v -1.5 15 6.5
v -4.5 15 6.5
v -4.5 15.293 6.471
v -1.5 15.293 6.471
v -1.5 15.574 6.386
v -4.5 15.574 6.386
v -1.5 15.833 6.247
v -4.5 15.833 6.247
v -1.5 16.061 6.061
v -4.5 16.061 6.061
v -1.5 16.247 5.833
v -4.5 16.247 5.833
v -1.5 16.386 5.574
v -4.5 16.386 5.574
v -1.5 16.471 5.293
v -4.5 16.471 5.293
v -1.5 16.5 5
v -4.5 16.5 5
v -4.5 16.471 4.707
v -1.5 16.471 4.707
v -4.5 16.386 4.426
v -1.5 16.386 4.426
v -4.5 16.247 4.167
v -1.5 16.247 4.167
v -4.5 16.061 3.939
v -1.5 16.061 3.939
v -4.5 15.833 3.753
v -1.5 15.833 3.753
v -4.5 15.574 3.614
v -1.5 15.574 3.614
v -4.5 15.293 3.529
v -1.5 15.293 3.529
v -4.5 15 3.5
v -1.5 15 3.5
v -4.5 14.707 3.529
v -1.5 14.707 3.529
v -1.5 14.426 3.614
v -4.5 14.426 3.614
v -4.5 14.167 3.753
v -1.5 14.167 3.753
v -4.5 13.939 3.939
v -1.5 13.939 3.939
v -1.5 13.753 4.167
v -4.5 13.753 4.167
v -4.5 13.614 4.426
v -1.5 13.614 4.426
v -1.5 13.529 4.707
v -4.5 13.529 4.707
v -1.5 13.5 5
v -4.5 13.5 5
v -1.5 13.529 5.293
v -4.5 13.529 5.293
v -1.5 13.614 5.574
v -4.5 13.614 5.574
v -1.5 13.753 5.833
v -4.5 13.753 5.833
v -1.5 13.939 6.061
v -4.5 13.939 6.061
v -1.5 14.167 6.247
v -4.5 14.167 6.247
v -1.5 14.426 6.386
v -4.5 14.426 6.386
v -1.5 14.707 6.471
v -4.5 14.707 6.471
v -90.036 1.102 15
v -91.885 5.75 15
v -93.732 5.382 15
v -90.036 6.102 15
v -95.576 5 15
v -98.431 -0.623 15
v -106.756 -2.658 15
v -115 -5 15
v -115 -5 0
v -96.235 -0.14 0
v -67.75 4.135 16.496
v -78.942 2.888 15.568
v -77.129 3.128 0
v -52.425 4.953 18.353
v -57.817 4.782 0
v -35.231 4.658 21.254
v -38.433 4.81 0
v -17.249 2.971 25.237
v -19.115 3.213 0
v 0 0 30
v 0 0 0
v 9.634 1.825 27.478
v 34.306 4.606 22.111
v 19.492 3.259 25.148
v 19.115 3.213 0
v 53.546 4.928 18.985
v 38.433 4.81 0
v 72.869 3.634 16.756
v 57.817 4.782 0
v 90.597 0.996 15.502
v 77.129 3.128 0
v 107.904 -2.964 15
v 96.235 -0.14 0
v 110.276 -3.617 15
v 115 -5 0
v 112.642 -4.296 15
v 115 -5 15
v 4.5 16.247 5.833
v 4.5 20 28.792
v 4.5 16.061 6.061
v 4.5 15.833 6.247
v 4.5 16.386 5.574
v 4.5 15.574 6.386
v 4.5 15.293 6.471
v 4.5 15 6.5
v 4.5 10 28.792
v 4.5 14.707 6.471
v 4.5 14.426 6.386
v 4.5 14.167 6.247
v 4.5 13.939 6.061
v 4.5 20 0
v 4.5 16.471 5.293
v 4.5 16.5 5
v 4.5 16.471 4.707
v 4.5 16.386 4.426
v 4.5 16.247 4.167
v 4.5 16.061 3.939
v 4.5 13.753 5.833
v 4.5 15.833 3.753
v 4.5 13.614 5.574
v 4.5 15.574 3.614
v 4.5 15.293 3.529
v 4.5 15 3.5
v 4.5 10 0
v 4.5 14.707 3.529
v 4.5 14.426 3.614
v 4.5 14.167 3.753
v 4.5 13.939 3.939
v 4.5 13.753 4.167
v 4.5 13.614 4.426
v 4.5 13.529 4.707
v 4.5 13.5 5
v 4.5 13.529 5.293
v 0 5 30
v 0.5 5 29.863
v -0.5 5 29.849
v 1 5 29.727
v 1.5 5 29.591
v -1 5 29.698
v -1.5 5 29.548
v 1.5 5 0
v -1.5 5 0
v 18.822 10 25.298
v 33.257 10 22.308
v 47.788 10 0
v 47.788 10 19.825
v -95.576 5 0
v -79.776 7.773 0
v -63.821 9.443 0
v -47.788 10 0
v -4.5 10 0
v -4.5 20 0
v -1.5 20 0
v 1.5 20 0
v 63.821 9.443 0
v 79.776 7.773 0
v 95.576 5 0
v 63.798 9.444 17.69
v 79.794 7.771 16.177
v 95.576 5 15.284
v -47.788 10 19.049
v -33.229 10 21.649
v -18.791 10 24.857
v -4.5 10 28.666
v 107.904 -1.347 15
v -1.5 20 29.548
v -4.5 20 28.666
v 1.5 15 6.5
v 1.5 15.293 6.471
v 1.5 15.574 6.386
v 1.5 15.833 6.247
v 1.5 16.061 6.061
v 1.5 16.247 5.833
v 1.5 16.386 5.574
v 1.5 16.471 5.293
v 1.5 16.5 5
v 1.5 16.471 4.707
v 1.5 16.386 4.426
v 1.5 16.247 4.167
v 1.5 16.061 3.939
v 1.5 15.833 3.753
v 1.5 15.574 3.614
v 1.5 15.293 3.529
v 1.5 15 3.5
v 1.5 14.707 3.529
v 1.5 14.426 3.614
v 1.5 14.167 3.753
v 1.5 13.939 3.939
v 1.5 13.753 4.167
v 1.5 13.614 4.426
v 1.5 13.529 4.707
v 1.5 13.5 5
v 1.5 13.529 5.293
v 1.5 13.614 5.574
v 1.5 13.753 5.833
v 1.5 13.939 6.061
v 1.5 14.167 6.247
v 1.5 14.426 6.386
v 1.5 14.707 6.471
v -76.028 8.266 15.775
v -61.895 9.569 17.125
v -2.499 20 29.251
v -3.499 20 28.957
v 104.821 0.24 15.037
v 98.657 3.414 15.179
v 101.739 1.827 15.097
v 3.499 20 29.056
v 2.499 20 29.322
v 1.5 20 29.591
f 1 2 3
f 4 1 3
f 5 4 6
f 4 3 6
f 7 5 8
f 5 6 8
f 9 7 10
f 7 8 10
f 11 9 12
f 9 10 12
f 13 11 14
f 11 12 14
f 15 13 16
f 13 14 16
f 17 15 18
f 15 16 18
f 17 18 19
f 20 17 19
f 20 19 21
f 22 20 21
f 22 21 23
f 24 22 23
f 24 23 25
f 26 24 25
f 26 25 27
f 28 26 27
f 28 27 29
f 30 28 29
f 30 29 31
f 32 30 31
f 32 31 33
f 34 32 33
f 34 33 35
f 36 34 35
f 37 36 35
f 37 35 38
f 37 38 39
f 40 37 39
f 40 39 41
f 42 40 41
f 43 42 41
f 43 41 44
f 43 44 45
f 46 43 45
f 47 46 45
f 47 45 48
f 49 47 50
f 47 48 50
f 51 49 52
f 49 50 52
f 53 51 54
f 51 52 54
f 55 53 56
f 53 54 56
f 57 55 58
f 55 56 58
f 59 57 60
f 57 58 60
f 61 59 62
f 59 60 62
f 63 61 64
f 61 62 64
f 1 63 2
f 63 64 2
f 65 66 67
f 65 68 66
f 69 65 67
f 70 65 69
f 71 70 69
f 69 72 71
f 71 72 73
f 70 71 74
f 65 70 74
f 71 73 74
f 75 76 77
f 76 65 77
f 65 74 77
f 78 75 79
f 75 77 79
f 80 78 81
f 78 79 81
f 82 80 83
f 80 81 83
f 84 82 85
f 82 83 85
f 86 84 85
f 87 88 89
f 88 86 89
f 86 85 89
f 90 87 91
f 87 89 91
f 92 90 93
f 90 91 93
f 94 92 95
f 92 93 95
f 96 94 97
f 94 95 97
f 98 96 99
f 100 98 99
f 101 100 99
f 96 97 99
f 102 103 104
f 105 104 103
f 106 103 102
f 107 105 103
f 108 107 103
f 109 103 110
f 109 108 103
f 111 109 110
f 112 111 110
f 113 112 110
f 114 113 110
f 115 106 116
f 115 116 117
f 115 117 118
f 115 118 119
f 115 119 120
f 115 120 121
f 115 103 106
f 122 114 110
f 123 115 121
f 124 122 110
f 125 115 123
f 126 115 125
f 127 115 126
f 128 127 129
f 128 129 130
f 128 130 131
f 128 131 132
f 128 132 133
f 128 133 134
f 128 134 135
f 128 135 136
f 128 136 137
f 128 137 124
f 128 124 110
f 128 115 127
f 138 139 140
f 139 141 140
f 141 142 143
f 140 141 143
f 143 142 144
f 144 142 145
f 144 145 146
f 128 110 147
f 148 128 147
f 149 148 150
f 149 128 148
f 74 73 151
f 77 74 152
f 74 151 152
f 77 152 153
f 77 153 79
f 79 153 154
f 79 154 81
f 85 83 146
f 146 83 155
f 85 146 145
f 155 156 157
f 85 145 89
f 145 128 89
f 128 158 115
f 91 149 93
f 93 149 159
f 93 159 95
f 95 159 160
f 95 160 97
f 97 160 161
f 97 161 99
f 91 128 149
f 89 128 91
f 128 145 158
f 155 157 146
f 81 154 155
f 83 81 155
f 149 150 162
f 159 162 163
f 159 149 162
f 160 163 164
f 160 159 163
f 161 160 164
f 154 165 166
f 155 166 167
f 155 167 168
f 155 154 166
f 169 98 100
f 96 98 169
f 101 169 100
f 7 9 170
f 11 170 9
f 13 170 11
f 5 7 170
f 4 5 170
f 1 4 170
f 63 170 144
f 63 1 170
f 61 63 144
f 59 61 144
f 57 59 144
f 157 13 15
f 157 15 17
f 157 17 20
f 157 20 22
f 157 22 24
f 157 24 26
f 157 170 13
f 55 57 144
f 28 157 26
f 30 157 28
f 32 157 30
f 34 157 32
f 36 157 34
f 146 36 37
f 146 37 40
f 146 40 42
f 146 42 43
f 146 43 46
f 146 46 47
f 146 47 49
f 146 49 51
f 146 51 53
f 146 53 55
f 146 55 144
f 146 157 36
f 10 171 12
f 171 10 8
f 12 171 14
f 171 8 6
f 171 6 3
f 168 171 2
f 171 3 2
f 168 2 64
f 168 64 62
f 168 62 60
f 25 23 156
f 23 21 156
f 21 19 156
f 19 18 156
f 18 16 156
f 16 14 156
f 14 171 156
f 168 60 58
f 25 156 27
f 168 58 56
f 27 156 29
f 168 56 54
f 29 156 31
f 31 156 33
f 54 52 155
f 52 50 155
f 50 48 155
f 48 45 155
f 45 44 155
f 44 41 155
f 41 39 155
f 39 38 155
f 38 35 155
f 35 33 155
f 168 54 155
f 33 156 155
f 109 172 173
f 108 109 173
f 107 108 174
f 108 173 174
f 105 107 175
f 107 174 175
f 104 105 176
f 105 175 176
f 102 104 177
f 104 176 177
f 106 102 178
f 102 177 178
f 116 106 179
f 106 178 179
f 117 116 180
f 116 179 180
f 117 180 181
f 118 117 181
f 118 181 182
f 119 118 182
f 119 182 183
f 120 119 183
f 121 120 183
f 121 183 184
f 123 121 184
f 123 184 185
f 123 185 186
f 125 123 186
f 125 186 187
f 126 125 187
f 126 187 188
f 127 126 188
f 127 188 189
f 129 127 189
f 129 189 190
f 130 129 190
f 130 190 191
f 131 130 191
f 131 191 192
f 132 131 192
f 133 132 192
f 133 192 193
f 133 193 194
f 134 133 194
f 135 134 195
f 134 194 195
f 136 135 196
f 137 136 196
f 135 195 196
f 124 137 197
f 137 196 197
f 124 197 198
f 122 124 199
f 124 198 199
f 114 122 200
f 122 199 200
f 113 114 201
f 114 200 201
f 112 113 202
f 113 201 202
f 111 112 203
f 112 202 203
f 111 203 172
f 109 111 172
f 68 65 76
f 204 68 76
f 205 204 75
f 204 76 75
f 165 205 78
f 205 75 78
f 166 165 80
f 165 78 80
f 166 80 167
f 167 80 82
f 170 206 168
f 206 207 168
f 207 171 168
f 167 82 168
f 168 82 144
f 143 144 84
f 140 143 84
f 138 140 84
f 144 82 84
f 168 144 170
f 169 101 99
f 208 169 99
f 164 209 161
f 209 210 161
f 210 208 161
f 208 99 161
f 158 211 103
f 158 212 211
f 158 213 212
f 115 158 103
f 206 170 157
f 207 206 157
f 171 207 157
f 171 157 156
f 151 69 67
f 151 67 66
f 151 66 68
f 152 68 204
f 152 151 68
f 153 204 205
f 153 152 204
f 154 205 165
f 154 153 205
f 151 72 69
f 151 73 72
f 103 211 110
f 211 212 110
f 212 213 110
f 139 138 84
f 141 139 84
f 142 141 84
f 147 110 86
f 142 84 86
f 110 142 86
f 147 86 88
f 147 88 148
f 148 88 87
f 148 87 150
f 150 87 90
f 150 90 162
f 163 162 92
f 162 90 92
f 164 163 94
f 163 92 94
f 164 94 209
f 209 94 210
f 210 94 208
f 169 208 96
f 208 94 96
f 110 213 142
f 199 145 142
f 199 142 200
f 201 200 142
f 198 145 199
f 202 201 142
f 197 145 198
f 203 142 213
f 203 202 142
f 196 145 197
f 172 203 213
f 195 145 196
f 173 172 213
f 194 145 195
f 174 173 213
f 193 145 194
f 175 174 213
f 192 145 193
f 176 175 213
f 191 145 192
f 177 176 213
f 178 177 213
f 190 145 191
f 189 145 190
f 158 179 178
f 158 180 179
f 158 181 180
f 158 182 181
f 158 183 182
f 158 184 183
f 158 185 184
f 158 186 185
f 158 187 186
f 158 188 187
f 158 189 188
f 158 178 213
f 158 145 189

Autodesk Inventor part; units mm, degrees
ref_plane "YZ Plane" through (0, 0, 0) normal (1, 0, 0) x (0, 1, 0)
ref_plane "XZ Plane" through (0, 0, 0) normal (0, 1, 0) x (-1, 0, 0)
ref_plane "XY Plane" through (0, 0, 0) normal (0, 0, 1) x (1, 0, 0)
sketch "Эскиз1" plane through (0, 0, 0) normal (0, 0, 1) x (1, 0, 0)
  line L0 (115, 5) -> (-115, 5)
  line L1 (-115, 5) -> (-115, -5)
  line L2 (-115, -5) -> (115, -5)
  line L3 (115, -5) -> (115, 5)
  line L4 (115, 5) -> (-115, -5) construction
  line L5 (-115, 5) -> (115, -5) construction
  arc A0 (0, 0) -> (-115, -5) centre (-47.7882, -225.8713) ccw
  arc A1 (115, -5) -> (0, 0) centre (47.7882, -225.8713) ccw
  line L6 (115, 10) -> (-115, 10)
  line L7 (-115, 10) -> (-115, 0)
  line L8 (-115, 0) -> (115, 0)
  line L9 (115, 0) -> (115, 10)
  line L10 (115, 10) -> (-115, 0) construction
  line L11 (-115, 10) -> (115, 0) construction
  arc A2 (0, 5) -> (-115, 0) centre (-47.7882, -220.8713) ccw
  arc A3 (115, 0) -> (0, 5) centre (47.7882, -220.8713) ccw
  line L12 (-115, -5) -> (-95.5764, 5)
  line L13 (115, -5) -> (95.5764, 5)
  line L14 (1.5, 15) -> (-1.5, 15)
  line L15 (-1.5, 15) -> (-1.5, -5)
  line L16 (-1.5, -5) -> (1.5, -5)
  line L17 (1.5, -5) -> (1.5, 15)
  line L18 (1.5, 15) -> (-1.5, -5) construction
  line L19 (-1.5, 15) -> (1.5, -5) construction
  line L20 (-1.5, 5) -> (1.5, 5)
  line L21 (1.5, 5) -> (1.5, 20)
  line L22 (1.5, 20) -> (-1.5, 20)
  line L23 (-1.5, 20) -> (-1.5, 5)
  circle A4 centre (0, 15) radius 1.5
  line L24 (1.5, 20) -> (4.5, 20)
  line L25 (4.5, 20) -> (4.5, 5)
  line L26 (4.5, 5) -> (1.5, 5)
  line L27 (1.5, 5) -> (1.5, 20)
  line L28 (-1.5, 20) -> (-4.5, 20)
  line L29 (-4.5, 20) -> (-4.5, 5)
  line L30 (-4.5, 5) -> (-1.5, 5)
  line L31 (-1.5, 5) -> (-1.5, 20)
  line L32 (-47.7882, 10) -> (-4.5, 10)
  line L33 (4.5, 10) -> (47.7882, 10)
  line L34 (4.5, 13.5) -> (-4.5, 13.5)
  line L35 (-4.5, 13.5) -> (-4.5, 16.5)
  line L36 (-4.5, 16.5) -> (4.5, 16.5)
  line L37 (4.5, 16.5) -> (4.5, 13.5)
  line L38 (4.5, 13.5) -> (-4.5, 16.5) construction
  line L39 (-4.5, 13.5) -> (4.5, 16.5) construction
  line L40 (4.5, 12.5) -> (-4.5, 12.5)
  line L41 (-4.5, 12.5) -> (-4.5, 17.5)
  line L42 (-4.5, 17.5) -> (4.5, 17.5)
  line L43 (4.5, 17.5) -> (4.5, 12.5)
  line L44 (4.5, 12.5) -> (-4.5, 17.5) construction
  line L45 (-4.5, 12.5) -> (4.5, 17.5) construction
  point P0 (1.5, 5.3122)
  point P1 (4.5, 5.9054)
  point P2 (-4.5, 5.9054)
  point P3 (-1.5, 5.3122)
  dimension "d6" = 3
  dimension "d0" = 230
  dimension "d1" = 10
  dimension "d4" = 3
  dimension "d5" = 15
  dimension "d7" = 3
  dimension "d8" = 3
  dimension "d9" = 5
extrude "Выдавливание1" add sketch "Эскиз1" along normal blind 30 contours L13 L8 A1 L0 | L0 L25 A3 | A1 L17 L0 | A3 L25 L6 | L13 A1 L8 | L0 L17 A3 L25 | A1 A0 L15 L0 L17 | L25 A3 L17 L6 | L6 L17 L40 L25 | L40 L17 L34 L25 | A0 L0 L15 | L15 A2 L29 L6 | L6 L29 L40 L15 | L34 L17 L21 L36 L25 | L12 L8 A0 | L0 L29 A2 L15 | L0 A2 L29 | A0 L8 L12 L0 | L29 A2 L6 | L40 L29 L34 L15 | L36 L21 L42 L25 | L34 L29 L36 L23 L15 | L42 L21 L24 L25 | L29 L42 L23 L36 | L42 L29 L28 L23
sketch "Эскиз2" plane through (0, 0, 0) normal (0, 1, 0) x (-1, 0, 0)
  line L0 (115, 0) -> (0, 0) projected
  line L1 (0, 0) -> (0, 30) projected
  line L2 (115, 30) -> (0, 30) projected
  line L3 (115, 0) -> (115, 30) projected
  line L4 (0, 0) -> (-115, 0) projected
  line L5 (-115, 0) -> (-115, 30) projected
  line L6 (0, 30) -> (-115, 30) projected
  line L7 (0, 0) -> (0, 30) projected
  line L8 (95.5764, 0) -> (115, 0) projected
  line L9 (-115, 0) -> (-115, 30) projected
  line L10 (115, 0) -> (-115, 0)
  line L11 (-115, 0) -> (-115, 15)
  line L12 (-115, 15) -> (115, 15)
  line L13 (115, 15) -> (115, 0)
  line L14 (0, 0) -> (0, 30) projected
  arc A0 (0, 30) -> (115, 15) centre (102.5177, 367.6359) ccw
  arc A1 (-115, 15) -> (0, 30) centre (-111.4518, 436.1301) ccw
  point P0 (90.0355, 15)
  point P1 (-107.9035, 15)
extrude "Выдавливание2" cut sketch "Эскиз2" along normal mid plane 40 contours L12 A0 L2 L3 | A1 L12 L5 L6
sketch "Эскиз7" plane through (-4.5, 10, 0) normal (-1, 0, 0) x (0, 0, 1)
  line L0 (0, 10) -> (28.6663, 10) projected
  line L1 (0, 10) -> (5, 10)
  line L2 (5, 10) -> (5, 5)
  line L3 (5, 5) -> (0, 5)
  line L4 (0, 5) -> (0, 10)
  circle A0 centre (5, 5) radius 1.5
  point P0 (0, -10)
  dimension "d68" = 5
  dimension "d69" = 5
  dimension "d70" = 3
extrude "Выдавливание7" cut sketch "Эскиз7" against normal blind 40 contours A0 L3 L2 | L2 L3 A0
properties part number "пиналка_верх"
